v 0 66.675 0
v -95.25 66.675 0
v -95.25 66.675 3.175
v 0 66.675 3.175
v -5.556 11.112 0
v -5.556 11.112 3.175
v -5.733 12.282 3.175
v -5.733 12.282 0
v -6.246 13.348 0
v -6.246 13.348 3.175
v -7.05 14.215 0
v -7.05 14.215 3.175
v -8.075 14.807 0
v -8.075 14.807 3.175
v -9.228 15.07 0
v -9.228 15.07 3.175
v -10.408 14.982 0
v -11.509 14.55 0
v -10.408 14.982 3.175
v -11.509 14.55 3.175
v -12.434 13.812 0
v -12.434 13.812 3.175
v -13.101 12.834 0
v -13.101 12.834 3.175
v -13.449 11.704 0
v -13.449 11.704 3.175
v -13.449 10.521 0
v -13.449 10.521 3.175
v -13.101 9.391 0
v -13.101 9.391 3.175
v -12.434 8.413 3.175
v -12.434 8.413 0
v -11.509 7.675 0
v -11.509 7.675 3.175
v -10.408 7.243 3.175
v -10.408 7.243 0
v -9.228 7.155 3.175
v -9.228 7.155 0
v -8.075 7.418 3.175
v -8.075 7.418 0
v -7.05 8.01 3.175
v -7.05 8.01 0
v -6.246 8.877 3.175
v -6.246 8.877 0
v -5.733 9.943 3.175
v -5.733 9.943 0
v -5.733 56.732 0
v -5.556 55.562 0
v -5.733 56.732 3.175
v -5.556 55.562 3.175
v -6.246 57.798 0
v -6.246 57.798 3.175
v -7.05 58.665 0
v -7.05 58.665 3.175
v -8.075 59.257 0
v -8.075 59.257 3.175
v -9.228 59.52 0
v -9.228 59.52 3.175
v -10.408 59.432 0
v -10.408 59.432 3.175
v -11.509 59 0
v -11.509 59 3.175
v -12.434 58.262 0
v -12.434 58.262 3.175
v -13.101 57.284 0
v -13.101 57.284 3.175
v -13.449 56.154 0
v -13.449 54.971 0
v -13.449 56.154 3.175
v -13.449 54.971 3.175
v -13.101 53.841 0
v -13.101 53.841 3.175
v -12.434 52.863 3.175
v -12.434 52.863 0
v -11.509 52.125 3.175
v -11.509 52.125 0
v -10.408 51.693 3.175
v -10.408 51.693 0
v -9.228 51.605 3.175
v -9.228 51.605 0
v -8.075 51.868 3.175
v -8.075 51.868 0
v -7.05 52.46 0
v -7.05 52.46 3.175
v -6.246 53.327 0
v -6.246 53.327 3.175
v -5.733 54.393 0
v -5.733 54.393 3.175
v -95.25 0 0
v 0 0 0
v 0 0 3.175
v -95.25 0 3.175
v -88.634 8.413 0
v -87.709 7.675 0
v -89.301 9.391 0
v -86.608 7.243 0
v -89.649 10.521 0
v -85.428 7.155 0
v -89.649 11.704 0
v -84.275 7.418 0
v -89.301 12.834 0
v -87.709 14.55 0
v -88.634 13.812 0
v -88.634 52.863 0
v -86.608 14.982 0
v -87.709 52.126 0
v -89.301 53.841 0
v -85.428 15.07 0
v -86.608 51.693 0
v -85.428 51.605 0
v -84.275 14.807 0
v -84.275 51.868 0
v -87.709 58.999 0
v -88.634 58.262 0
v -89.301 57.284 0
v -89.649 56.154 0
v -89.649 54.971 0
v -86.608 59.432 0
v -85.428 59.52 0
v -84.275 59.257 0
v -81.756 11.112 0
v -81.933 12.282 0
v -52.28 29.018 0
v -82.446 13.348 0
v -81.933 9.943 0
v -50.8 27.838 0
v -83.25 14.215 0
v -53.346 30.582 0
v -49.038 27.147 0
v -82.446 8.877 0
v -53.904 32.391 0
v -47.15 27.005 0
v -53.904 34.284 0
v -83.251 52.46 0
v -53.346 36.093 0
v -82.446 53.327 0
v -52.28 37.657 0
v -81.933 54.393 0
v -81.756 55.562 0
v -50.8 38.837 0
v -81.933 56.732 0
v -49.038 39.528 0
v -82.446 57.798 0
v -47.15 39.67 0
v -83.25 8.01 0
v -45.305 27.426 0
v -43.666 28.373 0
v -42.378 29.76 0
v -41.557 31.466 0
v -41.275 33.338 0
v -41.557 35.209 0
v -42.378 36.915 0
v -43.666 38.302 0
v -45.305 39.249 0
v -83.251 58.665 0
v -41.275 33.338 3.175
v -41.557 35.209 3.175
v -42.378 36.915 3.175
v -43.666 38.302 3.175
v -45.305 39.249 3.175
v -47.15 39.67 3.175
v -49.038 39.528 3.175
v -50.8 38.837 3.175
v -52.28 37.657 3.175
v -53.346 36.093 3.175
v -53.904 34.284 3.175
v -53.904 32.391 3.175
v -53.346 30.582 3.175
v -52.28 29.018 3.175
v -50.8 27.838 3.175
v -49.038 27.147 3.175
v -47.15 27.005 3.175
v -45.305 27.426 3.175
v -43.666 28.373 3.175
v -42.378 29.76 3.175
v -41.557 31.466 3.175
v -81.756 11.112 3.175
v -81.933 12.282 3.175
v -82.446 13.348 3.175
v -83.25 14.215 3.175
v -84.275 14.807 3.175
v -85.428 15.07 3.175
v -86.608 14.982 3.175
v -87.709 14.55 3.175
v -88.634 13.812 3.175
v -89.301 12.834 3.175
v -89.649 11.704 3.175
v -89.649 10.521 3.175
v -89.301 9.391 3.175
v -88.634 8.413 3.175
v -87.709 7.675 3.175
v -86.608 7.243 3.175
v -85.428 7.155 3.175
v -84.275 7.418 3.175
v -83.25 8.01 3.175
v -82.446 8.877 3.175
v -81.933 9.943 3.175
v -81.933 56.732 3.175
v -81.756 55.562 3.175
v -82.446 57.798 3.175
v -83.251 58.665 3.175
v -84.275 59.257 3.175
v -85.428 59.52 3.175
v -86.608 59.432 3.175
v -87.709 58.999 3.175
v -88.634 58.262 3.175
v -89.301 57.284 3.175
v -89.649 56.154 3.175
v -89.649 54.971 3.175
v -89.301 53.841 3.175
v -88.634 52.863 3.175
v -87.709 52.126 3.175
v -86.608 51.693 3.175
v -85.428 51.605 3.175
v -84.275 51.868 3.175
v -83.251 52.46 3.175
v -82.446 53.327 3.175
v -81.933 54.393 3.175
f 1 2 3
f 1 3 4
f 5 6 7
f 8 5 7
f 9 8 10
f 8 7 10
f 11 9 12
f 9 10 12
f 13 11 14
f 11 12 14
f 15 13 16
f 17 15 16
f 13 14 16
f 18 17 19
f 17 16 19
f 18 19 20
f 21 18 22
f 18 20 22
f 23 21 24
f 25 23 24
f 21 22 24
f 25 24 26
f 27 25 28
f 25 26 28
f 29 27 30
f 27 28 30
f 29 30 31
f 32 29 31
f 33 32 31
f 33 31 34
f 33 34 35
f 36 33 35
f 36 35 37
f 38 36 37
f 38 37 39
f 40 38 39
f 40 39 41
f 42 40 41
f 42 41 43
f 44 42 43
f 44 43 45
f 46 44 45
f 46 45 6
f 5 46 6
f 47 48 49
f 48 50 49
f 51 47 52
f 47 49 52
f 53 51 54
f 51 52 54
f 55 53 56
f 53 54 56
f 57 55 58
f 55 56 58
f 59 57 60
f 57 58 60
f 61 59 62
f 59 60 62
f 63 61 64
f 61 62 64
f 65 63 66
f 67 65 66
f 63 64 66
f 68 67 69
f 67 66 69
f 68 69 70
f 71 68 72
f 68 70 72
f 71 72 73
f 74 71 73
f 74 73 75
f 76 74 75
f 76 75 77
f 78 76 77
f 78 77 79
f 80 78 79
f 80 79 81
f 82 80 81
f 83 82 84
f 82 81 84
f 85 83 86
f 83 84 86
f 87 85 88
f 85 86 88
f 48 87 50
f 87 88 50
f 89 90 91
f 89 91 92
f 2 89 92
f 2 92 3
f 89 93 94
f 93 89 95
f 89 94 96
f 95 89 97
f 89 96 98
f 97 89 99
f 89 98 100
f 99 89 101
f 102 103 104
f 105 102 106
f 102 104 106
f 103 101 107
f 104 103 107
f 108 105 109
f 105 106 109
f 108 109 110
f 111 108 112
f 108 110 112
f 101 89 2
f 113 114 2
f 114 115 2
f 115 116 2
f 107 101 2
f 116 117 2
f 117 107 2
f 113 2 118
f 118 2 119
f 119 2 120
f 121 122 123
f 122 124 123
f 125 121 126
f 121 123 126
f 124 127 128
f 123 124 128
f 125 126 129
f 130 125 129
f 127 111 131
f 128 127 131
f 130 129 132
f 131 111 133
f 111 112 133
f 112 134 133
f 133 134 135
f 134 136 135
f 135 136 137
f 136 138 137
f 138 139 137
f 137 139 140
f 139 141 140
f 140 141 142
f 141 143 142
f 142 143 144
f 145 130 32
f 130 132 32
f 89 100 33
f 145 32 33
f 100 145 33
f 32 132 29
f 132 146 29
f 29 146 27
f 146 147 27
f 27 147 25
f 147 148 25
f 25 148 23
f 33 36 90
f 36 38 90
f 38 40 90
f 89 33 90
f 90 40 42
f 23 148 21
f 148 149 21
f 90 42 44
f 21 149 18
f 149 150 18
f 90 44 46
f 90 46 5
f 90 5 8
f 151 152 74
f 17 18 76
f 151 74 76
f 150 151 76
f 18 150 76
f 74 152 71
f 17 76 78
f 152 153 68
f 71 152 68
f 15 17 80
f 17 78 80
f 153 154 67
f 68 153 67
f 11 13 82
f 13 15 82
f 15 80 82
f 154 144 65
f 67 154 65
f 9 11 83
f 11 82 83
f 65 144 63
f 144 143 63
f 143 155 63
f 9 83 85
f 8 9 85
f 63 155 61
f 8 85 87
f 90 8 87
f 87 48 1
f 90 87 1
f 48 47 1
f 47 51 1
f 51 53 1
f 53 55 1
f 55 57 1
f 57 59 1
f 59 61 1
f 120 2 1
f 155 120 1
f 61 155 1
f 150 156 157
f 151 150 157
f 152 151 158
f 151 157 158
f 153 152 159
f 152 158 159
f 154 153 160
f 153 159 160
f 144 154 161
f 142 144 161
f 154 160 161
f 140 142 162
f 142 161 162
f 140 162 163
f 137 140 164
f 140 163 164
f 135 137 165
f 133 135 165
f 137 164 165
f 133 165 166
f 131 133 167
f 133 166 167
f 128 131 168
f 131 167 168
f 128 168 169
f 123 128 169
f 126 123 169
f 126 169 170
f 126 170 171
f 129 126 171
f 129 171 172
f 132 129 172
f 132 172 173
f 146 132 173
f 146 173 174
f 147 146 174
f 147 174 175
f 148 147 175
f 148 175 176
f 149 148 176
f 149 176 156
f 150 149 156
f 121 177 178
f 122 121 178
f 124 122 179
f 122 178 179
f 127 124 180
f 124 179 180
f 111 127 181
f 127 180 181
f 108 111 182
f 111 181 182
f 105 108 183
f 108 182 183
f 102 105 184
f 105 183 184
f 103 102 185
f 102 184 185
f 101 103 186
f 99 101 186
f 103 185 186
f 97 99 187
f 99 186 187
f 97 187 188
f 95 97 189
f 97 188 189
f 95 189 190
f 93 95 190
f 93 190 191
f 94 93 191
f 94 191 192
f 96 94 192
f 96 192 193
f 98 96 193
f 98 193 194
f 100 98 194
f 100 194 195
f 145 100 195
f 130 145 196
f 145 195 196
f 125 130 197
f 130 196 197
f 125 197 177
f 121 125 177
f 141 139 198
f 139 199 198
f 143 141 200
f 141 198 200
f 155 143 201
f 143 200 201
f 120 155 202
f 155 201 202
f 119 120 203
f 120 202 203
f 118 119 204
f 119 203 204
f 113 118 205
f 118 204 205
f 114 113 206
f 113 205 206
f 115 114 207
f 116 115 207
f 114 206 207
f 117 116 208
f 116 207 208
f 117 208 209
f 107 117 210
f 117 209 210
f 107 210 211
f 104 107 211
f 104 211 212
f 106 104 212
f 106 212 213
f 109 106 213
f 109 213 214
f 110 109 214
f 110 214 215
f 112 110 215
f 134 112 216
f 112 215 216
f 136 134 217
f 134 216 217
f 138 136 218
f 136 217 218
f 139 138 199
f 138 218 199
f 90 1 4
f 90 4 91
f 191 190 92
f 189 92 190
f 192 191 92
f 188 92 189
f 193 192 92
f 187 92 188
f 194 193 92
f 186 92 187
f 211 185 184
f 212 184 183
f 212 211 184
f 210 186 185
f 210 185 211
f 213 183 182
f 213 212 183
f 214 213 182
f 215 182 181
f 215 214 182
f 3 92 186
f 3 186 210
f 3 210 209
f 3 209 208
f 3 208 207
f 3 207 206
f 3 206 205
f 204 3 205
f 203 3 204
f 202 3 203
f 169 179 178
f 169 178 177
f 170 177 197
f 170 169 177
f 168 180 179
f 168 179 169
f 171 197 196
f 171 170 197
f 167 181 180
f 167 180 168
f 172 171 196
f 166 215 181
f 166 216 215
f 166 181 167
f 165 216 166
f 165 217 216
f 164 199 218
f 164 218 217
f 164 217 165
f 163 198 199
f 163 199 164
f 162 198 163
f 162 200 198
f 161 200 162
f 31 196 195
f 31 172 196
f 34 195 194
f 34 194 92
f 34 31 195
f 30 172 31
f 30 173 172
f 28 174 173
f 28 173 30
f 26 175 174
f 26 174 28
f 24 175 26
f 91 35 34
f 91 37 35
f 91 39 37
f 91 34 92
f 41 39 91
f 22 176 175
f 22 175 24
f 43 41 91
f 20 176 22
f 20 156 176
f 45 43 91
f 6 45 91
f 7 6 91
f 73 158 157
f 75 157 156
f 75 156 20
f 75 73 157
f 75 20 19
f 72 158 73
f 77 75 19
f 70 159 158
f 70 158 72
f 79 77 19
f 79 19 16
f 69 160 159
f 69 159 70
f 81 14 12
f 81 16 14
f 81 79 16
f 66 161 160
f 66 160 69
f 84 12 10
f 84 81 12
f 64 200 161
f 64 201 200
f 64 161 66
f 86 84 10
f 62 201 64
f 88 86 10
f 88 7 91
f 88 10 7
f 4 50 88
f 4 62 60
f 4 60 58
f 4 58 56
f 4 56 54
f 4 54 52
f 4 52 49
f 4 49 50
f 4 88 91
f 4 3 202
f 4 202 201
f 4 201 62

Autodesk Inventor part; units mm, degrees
ref_plane "YZ Plane" through (0, 0, 0) normal (1, 0, 0) x (0, 1, 0)
ref_plane "XZ Plane" through (0, 0, 0) normal (0, 1, 0) x (-1, 0, 0)
ref_plane "XY Plane" through (0, 0, 0) normal (0, 0, 1) x (1, 0, 0)
sketch "Sketch1" plane through (0, 0, 0) normal (0, 0, 1) x (1, 0, 0)
  line L0 (0, 0) -> (-95.25, 0)
  line L1 (-95.25, 0) -> (-95.25, 66.675)
  line L2 (-95.25, 66.675) -> (0, 66.675)
  line L3 (0, 66.675) -> (0, 0)
  dimension "d0" = 66.675
  dimension "d1" = 95.25
extrude "Extrusion1" add sketch "Sketch1" along normal blind 3.175
sketch "Sketch2" plane through (0, 0, 3.175) normal (0, 0, 1) x (1, 0, 0)
  line L0 (-95.25, 0) -> (-95.25, 66.675) projected
  line L1 (0, 66.675) -> (0, 0) projected
  line L2 (-95.25, 66.675) -> (0, 66.675) projected
  line L3 (-95.25, 33.3375) -> (-95.25, 55.5625)
  line L4 (-47.625, 66.675) -> (-85.725, 66.675)
  line L5 (-85.725, 66.675) -> (-85.725, 55.5625)
  line L6 (-95.25, 33.3375) -> (-95.25, 11.1125)
  line L7 (-95.25, 11.1125) -> (-85.725, 11.1125)
  line L8 (-47.625, 66.675) -> (-9.525, 66.675)
  line L9 (-9.525, 66.675) -> (-9.525, 55.5625)
  line L10 (0, 11.1125) -> (-9.525, 11.1125)
  circle A0 centre (-85.725, 55.5625) radius 3.9687
  circle A1 centre (-9.525, 55.5625) radius 3.9688
  circle A2 centre (-85.725, 11.1125) radius 3.9688
  circle A3 centre (-9.525, 11.1125) radius 3.9688
  dimension "d4" = 22.225
  dimension "d5" = 38.1
  dimension "d6" = 22.225
  dimension "d7" = 38.1
  dimension "d8" = 7.9375
  dimension "d9" = 7.9375
  dimension "d10" = 7.9375
  dimension "d11" = 7.9375
extrude "Extrusion2" cut sketch "Sketch2" against normal blind 3.175
sketch "Sketch3" plane through (0, 0, 3.175) normal (0, 0, 1) x (1, 0, 0)
  circle A0 centre (-47.625, 33.3375) radius 6.35
  dimension "d14" = 12.7
extrude "Extrusion3" cut sketch "Sketch3" against normal blind 3.175
properties part number "mount plate"
